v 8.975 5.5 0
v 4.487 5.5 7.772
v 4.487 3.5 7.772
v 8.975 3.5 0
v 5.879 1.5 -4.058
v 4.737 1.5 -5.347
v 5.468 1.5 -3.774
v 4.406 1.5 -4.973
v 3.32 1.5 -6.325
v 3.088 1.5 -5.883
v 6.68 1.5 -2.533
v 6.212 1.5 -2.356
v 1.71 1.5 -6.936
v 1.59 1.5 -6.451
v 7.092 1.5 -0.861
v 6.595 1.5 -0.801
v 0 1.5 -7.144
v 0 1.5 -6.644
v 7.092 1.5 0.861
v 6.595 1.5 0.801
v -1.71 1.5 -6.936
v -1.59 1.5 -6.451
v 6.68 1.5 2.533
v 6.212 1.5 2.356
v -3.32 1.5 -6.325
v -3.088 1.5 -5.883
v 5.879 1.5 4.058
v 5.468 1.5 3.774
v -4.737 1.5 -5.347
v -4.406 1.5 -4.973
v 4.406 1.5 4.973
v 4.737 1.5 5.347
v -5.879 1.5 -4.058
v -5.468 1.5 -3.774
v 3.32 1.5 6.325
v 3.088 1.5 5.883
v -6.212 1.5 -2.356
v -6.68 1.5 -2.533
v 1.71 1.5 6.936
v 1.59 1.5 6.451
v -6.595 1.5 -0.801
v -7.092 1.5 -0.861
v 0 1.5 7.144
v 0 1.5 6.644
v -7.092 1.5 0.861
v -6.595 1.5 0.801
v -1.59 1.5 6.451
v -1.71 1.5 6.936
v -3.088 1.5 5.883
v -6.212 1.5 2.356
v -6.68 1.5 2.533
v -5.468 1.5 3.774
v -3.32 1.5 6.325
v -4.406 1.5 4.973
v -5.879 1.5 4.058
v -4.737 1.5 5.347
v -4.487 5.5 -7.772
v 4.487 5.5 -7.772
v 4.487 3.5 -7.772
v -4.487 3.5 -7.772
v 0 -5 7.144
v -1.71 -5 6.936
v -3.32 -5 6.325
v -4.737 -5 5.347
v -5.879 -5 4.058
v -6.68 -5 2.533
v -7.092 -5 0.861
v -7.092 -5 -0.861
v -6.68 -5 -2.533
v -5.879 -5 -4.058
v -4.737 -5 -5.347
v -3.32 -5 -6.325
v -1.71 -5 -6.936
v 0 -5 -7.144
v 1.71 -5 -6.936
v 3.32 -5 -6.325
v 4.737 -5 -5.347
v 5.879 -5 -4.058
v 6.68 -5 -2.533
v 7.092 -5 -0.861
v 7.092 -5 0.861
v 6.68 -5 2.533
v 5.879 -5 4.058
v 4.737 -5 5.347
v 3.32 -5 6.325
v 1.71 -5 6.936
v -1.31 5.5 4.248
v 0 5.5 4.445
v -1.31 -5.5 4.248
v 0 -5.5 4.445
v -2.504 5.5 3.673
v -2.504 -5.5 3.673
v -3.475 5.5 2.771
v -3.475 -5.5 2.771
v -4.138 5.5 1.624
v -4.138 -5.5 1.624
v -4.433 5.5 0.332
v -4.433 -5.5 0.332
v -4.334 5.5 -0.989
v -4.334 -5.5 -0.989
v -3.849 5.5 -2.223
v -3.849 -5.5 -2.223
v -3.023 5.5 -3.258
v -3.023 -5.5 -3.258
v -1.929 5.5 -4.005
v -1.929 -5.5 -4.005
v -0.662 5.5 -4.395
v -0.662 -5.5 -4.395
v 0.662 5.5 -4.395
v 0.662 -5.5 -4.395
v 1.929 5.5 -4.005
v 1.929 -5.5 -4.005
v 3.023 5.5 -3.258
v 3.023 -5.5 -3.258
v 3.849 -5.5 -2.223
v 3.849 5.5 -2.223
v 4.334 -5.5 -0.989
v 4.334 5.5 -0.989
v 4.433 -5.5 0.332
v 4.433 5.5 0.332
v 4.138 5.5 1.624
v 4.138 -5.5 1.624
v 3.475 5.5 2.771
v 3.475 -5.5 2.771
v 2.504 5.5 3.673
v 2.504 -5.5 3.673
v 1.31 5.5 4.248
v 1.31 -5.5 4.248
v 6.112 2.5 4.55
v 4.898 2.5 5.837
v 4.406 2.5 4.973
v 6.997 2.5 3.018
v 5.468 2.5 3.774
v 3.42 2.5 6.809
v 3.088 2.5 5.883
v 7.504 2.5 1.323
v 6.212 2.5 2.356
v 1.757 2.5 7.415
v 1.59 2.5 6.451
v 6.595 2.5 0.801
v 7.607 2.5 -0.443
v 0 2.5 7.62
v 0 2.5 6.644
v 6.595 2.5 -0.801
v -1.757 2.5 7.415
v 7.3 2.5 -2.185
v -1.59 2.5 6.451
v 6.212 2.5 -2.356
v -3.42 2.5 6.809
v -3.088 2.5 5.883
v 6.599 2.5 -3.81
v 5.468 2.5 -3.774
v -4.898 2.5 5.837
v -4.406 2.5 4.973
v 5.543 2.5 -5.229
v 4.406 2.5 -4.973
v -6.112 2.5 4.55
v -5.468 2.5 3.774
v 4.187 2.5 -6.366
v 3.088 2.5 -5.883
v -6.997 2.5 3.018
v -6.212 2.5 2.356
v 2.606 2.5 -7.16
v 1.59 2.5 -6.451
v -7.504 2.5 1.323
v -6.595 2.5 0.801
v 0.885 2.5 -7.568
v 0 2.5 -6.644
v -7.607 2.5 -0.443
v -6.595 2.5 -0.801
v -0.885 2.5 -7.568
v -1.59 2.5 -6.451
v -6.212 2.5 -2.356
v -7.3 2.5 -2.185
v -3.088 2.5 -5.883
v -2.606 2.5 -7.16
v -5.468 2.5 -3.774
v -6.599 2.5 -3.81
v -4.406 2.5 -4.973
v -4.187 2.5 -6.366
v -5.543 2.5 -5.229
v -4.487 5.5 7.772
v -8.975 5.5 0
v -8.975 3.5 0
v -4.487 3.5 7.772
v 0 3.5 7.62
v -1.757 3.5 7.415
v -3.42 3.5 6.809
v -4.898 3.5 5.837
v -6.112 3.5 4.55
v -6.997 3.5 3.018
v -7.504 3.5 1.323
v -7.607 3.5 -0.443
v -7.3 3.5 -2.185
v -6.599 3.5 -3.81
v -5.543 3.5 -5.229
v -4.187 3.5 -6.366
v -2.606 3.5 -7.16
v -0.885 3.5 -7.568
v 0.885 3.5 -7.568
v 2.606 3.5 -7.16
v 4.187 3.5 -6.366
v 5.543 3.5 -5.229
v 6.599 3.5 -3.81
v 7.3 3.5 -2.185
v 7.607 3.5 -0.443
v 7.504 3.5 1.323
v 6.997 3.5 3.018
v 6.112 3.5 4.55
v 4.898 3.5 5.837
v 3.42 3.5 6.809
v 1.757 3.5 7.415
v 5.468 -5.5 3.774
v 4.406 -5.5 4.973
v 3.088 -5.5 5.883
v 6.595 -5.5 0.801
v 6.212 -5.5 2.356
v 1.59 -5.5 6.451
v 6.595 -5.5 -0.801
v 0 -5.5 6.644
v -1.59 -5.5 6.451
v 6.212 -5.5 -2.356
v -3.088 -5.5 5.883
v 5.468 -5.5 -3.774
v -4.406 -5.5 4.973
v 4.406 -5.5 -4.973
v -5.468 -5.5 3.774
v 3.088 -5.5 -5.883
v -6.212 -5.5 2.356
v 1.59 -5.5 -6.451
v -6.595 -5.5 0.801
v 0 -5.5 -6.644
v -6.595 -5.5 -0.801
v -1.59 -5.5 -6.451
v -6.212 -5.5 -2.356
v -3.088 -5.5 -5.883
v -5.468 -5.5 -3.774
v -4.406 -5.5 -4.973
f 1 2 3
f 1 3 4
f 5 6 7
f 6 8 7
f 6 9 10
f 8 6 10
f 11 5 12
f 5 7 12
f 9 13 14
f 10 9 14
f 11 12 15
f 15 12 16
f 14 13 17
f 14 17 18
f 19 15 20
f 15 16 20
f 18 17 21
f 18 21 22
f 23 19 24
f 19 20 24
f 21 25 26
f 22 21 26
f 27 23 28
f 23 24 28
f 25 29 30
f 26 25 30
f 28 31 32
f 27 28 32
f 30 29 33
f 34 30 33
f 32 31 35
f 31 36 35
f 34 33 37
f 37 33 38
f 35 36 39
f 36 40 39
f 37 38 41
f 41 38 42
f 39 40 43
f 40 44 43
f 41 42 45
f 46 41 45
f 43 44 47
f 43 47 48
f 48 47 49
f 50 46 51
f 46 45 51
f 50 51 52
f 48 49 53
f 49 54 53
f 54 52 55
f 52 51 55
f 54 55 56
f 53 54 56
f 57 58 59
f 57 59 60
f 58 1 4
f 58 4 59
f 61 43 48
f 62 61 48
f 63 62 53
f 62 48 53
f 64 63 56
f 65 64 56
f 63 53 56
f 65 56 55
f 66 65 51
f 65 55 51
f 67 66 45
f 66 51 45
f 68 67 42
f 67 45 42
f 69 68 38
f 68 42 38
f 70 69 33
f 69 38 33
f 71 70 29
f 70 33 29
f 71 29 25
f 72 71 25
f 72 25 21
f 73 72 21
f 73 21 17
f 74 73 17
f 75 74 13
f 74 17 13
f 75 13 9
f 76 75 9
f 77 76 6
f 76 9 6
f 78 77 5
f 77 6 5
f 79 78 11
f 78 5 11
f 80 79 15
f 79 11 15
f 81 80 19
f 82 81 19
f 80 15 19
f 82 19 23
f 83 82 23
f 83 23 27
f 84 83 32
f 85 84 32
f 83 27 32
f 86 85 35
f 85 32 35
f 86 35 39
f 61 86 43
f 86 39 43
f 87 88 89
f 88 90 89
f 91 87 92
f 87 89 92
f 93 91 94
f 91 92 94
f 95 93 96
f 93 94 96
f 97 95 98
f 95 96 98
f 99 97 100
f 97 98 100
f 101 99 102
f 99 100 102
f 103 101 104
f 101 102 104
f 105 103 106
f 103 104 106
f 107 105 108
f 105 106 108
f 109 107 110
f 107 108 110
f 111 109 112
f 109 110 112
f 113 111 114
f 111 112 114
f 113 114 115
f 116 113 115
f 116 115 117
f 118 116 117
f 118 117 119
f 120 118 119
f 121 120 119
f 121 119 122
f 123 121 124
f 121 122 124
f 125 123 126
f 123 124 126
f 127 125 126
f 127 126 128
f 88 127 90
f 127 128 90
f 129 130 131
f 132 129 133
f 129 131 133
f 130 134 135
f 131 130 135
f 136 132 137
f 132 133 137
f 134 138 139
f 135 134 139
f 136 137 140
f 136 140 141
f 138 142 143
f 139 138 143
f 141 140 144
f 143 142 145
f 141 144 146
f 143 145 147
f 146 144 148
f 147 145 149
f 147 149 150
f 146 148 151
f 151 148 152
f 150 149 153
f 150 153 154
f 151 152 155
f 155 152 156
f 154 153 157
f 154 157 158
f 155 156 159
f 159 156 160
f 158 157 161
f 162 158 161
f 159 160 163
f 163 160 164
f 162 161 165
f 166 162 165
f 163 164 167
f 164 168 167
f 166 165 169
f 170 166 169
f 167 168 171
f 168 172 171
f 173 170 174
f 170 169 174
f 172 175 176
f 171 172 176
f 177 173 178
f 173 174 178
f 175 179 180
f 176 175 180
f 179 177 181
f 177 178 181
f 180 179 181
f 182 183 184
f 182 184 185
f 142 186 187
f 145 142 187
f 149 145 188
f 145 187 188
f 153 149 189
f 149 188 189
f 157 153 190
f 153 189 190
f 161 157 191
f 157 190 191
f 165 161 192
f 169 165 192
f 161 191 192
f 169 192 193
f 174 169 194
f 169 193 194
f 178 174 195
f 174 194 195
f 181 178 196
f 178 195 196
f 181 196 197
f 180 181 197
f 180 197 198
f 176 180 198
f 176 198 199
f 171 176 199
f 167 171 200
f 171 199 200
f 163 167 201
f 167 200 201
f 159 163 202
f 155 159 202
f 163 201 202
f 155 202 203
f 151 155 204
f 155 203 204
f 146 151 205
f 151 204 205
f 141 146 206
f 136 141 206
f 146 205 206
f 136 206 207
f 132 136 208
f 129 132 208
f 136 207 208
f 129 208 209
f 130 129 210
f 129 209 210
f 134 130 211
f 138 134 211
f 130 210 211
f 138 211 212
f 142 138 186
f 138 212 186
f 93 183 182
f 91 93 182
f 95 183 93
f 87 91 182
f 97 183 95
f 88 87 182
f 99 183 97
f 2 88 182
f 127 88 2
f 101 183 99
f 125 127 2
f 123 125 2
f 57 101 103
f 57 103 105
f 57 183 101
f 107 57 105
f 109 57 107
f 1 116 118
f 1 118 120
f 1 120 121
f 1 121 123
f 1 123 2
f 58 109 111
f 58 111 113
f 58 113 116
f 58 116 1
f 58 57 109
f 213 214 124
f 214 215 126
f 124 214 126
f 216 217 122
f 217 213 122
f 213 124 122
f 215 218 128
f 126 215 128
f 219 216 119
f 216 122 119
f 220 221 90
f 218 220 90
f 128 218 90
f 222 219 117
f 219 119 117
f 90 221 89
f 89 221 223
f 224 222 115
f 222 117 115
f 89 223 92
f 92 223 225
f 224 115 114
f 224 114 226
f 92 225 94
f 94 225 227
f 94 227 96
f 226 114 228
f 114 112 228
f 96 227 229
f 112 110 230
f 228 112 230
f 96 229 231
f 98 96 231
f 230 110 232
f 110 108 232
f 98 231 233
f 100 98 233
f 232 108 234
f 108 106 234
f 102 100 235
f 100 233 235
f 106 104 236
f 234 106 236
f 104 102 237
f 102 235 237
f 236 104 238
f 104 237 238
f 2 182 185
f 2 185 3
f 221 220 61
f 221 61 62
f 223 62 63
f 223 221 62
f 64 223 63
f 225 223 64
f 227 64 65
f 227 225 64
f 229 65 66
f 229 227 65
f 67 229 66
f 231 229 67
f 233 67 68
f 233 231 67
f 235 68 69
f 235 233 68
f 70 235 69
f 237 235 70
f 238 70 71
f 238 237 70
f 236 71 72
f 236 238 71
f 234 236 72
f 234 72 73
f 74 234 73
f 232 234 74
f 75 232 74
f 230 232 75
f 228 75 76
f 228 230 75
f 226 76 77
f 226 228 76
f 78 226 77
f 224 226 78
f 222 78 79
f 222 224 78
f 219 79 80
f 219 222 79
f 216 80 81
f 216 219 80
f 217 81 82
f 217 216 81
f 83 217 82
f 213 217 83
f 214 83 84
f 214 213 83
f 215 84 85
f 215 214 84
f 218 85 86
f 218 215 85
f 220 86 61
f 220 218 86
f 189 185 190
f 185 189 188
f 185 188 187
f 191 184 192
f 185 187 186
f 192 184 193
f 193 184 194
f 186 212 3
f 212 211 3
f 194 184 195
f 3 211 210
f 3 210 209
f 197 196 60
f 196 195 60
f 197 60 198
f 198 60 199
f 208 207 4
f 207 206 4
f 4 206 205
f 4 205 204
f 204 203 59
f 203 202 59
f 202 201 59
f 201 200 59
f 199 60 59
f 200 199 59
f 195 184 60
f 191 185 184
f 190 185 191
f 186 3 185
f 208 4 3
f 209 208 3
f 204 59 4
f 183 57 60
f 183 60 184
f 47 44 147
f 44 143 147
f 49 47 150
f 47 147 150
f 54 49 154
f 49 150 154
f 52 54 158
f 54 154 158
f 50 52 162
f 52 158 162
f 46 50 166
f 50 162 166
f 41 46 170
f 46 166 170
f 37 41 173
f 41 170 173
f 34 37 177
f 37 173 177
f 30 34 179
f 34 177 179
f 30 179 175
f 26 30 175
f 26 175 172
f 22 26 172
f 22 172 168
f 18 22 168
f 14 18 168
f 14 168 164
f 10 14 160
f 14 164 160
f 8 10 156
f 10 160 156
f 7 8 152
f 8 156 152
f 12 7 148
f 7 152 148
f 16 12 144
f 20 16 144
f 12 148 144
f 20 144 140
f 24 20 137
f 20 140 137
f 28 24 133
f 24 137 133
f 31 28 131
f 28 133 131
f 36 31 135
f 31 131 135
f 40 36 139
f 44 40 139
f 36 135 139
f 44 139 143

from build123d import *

# Parameters (mm, degrees)
SKETCH2_R           = 7.62
SKETCH2_R_2         = 4.445
BOSS_EXTRUDE1_DEPTH = 2
CHAMFER1_SIZE       = 0.5


with BuildPart() as part:
    # Sketch1 → Revolve1 (revolve)
    with BuildSketch(Plane(origin=(0, 0, 0), x_dir=(0, 0, -1), z_dir=(1, 0, 0)), mode=Mode.PRIVATE) as revolve1_sk:
        Polygon((7.62, 2.5), (7.62, 5.5), (4.445, 5.5), (4.445, -5.5), (7.14375, -5.5), (7.14375, 1.5), (6.64375, 1.5), (6.64375, 2.5), align=None)
    revolve(revolve1_sk.sketch.rotate(Axis((0, 13.854588054, 0), (0, -1, 0)), 180), axis=Axis((0, 13.854588054, 0), (0, -1, 0)))  # turned: the seam where the file's is

    # Sketch2 → Boss-Extrude1 (add)
    with BuildSketch(Plane(origin=(0, 5.5, 0), x_dir=(1, 0, 0), z_dir=(0, 1, 0))):
        Polygon((4.487397232, 7.7724), (-4.487397232, 7.7724), (-8.974794464, 0), (-4.487397232, -7.7724), (4.487397232, -7.7724), (8.974794464, 0), align=None)
        with Locations(Location((0, 0, 0), (0, 0, 270))):  # turned: the seam where the file's is
            Circle(SKETCH2_R, mode=Mode.SUBTRACT)
        with Locations(Location((0, 0, 0), (0, 0, 270))):  # turned: the seam where the file's is
            Circle(SKETCH2_R)
        with Locations(Location((0, 0, 0), (0, 0, 270))):  # turned: the seam where the file's is
            Circle(SKETCH2_R_2, mode=Mode.SUBTRACT)
    extrude(amount=-BOSS_EXTRUDE1_DEPTH)

    # Chamfer1
    chamfer1_edges = [part.edges().sort_by_distance(p)[0] for p in [
        (0, -5.5, -7.14375),
    ]]
    chamfer(chamfer1_edges, length=CHAMFER1_SIZE)


solid = part.part
